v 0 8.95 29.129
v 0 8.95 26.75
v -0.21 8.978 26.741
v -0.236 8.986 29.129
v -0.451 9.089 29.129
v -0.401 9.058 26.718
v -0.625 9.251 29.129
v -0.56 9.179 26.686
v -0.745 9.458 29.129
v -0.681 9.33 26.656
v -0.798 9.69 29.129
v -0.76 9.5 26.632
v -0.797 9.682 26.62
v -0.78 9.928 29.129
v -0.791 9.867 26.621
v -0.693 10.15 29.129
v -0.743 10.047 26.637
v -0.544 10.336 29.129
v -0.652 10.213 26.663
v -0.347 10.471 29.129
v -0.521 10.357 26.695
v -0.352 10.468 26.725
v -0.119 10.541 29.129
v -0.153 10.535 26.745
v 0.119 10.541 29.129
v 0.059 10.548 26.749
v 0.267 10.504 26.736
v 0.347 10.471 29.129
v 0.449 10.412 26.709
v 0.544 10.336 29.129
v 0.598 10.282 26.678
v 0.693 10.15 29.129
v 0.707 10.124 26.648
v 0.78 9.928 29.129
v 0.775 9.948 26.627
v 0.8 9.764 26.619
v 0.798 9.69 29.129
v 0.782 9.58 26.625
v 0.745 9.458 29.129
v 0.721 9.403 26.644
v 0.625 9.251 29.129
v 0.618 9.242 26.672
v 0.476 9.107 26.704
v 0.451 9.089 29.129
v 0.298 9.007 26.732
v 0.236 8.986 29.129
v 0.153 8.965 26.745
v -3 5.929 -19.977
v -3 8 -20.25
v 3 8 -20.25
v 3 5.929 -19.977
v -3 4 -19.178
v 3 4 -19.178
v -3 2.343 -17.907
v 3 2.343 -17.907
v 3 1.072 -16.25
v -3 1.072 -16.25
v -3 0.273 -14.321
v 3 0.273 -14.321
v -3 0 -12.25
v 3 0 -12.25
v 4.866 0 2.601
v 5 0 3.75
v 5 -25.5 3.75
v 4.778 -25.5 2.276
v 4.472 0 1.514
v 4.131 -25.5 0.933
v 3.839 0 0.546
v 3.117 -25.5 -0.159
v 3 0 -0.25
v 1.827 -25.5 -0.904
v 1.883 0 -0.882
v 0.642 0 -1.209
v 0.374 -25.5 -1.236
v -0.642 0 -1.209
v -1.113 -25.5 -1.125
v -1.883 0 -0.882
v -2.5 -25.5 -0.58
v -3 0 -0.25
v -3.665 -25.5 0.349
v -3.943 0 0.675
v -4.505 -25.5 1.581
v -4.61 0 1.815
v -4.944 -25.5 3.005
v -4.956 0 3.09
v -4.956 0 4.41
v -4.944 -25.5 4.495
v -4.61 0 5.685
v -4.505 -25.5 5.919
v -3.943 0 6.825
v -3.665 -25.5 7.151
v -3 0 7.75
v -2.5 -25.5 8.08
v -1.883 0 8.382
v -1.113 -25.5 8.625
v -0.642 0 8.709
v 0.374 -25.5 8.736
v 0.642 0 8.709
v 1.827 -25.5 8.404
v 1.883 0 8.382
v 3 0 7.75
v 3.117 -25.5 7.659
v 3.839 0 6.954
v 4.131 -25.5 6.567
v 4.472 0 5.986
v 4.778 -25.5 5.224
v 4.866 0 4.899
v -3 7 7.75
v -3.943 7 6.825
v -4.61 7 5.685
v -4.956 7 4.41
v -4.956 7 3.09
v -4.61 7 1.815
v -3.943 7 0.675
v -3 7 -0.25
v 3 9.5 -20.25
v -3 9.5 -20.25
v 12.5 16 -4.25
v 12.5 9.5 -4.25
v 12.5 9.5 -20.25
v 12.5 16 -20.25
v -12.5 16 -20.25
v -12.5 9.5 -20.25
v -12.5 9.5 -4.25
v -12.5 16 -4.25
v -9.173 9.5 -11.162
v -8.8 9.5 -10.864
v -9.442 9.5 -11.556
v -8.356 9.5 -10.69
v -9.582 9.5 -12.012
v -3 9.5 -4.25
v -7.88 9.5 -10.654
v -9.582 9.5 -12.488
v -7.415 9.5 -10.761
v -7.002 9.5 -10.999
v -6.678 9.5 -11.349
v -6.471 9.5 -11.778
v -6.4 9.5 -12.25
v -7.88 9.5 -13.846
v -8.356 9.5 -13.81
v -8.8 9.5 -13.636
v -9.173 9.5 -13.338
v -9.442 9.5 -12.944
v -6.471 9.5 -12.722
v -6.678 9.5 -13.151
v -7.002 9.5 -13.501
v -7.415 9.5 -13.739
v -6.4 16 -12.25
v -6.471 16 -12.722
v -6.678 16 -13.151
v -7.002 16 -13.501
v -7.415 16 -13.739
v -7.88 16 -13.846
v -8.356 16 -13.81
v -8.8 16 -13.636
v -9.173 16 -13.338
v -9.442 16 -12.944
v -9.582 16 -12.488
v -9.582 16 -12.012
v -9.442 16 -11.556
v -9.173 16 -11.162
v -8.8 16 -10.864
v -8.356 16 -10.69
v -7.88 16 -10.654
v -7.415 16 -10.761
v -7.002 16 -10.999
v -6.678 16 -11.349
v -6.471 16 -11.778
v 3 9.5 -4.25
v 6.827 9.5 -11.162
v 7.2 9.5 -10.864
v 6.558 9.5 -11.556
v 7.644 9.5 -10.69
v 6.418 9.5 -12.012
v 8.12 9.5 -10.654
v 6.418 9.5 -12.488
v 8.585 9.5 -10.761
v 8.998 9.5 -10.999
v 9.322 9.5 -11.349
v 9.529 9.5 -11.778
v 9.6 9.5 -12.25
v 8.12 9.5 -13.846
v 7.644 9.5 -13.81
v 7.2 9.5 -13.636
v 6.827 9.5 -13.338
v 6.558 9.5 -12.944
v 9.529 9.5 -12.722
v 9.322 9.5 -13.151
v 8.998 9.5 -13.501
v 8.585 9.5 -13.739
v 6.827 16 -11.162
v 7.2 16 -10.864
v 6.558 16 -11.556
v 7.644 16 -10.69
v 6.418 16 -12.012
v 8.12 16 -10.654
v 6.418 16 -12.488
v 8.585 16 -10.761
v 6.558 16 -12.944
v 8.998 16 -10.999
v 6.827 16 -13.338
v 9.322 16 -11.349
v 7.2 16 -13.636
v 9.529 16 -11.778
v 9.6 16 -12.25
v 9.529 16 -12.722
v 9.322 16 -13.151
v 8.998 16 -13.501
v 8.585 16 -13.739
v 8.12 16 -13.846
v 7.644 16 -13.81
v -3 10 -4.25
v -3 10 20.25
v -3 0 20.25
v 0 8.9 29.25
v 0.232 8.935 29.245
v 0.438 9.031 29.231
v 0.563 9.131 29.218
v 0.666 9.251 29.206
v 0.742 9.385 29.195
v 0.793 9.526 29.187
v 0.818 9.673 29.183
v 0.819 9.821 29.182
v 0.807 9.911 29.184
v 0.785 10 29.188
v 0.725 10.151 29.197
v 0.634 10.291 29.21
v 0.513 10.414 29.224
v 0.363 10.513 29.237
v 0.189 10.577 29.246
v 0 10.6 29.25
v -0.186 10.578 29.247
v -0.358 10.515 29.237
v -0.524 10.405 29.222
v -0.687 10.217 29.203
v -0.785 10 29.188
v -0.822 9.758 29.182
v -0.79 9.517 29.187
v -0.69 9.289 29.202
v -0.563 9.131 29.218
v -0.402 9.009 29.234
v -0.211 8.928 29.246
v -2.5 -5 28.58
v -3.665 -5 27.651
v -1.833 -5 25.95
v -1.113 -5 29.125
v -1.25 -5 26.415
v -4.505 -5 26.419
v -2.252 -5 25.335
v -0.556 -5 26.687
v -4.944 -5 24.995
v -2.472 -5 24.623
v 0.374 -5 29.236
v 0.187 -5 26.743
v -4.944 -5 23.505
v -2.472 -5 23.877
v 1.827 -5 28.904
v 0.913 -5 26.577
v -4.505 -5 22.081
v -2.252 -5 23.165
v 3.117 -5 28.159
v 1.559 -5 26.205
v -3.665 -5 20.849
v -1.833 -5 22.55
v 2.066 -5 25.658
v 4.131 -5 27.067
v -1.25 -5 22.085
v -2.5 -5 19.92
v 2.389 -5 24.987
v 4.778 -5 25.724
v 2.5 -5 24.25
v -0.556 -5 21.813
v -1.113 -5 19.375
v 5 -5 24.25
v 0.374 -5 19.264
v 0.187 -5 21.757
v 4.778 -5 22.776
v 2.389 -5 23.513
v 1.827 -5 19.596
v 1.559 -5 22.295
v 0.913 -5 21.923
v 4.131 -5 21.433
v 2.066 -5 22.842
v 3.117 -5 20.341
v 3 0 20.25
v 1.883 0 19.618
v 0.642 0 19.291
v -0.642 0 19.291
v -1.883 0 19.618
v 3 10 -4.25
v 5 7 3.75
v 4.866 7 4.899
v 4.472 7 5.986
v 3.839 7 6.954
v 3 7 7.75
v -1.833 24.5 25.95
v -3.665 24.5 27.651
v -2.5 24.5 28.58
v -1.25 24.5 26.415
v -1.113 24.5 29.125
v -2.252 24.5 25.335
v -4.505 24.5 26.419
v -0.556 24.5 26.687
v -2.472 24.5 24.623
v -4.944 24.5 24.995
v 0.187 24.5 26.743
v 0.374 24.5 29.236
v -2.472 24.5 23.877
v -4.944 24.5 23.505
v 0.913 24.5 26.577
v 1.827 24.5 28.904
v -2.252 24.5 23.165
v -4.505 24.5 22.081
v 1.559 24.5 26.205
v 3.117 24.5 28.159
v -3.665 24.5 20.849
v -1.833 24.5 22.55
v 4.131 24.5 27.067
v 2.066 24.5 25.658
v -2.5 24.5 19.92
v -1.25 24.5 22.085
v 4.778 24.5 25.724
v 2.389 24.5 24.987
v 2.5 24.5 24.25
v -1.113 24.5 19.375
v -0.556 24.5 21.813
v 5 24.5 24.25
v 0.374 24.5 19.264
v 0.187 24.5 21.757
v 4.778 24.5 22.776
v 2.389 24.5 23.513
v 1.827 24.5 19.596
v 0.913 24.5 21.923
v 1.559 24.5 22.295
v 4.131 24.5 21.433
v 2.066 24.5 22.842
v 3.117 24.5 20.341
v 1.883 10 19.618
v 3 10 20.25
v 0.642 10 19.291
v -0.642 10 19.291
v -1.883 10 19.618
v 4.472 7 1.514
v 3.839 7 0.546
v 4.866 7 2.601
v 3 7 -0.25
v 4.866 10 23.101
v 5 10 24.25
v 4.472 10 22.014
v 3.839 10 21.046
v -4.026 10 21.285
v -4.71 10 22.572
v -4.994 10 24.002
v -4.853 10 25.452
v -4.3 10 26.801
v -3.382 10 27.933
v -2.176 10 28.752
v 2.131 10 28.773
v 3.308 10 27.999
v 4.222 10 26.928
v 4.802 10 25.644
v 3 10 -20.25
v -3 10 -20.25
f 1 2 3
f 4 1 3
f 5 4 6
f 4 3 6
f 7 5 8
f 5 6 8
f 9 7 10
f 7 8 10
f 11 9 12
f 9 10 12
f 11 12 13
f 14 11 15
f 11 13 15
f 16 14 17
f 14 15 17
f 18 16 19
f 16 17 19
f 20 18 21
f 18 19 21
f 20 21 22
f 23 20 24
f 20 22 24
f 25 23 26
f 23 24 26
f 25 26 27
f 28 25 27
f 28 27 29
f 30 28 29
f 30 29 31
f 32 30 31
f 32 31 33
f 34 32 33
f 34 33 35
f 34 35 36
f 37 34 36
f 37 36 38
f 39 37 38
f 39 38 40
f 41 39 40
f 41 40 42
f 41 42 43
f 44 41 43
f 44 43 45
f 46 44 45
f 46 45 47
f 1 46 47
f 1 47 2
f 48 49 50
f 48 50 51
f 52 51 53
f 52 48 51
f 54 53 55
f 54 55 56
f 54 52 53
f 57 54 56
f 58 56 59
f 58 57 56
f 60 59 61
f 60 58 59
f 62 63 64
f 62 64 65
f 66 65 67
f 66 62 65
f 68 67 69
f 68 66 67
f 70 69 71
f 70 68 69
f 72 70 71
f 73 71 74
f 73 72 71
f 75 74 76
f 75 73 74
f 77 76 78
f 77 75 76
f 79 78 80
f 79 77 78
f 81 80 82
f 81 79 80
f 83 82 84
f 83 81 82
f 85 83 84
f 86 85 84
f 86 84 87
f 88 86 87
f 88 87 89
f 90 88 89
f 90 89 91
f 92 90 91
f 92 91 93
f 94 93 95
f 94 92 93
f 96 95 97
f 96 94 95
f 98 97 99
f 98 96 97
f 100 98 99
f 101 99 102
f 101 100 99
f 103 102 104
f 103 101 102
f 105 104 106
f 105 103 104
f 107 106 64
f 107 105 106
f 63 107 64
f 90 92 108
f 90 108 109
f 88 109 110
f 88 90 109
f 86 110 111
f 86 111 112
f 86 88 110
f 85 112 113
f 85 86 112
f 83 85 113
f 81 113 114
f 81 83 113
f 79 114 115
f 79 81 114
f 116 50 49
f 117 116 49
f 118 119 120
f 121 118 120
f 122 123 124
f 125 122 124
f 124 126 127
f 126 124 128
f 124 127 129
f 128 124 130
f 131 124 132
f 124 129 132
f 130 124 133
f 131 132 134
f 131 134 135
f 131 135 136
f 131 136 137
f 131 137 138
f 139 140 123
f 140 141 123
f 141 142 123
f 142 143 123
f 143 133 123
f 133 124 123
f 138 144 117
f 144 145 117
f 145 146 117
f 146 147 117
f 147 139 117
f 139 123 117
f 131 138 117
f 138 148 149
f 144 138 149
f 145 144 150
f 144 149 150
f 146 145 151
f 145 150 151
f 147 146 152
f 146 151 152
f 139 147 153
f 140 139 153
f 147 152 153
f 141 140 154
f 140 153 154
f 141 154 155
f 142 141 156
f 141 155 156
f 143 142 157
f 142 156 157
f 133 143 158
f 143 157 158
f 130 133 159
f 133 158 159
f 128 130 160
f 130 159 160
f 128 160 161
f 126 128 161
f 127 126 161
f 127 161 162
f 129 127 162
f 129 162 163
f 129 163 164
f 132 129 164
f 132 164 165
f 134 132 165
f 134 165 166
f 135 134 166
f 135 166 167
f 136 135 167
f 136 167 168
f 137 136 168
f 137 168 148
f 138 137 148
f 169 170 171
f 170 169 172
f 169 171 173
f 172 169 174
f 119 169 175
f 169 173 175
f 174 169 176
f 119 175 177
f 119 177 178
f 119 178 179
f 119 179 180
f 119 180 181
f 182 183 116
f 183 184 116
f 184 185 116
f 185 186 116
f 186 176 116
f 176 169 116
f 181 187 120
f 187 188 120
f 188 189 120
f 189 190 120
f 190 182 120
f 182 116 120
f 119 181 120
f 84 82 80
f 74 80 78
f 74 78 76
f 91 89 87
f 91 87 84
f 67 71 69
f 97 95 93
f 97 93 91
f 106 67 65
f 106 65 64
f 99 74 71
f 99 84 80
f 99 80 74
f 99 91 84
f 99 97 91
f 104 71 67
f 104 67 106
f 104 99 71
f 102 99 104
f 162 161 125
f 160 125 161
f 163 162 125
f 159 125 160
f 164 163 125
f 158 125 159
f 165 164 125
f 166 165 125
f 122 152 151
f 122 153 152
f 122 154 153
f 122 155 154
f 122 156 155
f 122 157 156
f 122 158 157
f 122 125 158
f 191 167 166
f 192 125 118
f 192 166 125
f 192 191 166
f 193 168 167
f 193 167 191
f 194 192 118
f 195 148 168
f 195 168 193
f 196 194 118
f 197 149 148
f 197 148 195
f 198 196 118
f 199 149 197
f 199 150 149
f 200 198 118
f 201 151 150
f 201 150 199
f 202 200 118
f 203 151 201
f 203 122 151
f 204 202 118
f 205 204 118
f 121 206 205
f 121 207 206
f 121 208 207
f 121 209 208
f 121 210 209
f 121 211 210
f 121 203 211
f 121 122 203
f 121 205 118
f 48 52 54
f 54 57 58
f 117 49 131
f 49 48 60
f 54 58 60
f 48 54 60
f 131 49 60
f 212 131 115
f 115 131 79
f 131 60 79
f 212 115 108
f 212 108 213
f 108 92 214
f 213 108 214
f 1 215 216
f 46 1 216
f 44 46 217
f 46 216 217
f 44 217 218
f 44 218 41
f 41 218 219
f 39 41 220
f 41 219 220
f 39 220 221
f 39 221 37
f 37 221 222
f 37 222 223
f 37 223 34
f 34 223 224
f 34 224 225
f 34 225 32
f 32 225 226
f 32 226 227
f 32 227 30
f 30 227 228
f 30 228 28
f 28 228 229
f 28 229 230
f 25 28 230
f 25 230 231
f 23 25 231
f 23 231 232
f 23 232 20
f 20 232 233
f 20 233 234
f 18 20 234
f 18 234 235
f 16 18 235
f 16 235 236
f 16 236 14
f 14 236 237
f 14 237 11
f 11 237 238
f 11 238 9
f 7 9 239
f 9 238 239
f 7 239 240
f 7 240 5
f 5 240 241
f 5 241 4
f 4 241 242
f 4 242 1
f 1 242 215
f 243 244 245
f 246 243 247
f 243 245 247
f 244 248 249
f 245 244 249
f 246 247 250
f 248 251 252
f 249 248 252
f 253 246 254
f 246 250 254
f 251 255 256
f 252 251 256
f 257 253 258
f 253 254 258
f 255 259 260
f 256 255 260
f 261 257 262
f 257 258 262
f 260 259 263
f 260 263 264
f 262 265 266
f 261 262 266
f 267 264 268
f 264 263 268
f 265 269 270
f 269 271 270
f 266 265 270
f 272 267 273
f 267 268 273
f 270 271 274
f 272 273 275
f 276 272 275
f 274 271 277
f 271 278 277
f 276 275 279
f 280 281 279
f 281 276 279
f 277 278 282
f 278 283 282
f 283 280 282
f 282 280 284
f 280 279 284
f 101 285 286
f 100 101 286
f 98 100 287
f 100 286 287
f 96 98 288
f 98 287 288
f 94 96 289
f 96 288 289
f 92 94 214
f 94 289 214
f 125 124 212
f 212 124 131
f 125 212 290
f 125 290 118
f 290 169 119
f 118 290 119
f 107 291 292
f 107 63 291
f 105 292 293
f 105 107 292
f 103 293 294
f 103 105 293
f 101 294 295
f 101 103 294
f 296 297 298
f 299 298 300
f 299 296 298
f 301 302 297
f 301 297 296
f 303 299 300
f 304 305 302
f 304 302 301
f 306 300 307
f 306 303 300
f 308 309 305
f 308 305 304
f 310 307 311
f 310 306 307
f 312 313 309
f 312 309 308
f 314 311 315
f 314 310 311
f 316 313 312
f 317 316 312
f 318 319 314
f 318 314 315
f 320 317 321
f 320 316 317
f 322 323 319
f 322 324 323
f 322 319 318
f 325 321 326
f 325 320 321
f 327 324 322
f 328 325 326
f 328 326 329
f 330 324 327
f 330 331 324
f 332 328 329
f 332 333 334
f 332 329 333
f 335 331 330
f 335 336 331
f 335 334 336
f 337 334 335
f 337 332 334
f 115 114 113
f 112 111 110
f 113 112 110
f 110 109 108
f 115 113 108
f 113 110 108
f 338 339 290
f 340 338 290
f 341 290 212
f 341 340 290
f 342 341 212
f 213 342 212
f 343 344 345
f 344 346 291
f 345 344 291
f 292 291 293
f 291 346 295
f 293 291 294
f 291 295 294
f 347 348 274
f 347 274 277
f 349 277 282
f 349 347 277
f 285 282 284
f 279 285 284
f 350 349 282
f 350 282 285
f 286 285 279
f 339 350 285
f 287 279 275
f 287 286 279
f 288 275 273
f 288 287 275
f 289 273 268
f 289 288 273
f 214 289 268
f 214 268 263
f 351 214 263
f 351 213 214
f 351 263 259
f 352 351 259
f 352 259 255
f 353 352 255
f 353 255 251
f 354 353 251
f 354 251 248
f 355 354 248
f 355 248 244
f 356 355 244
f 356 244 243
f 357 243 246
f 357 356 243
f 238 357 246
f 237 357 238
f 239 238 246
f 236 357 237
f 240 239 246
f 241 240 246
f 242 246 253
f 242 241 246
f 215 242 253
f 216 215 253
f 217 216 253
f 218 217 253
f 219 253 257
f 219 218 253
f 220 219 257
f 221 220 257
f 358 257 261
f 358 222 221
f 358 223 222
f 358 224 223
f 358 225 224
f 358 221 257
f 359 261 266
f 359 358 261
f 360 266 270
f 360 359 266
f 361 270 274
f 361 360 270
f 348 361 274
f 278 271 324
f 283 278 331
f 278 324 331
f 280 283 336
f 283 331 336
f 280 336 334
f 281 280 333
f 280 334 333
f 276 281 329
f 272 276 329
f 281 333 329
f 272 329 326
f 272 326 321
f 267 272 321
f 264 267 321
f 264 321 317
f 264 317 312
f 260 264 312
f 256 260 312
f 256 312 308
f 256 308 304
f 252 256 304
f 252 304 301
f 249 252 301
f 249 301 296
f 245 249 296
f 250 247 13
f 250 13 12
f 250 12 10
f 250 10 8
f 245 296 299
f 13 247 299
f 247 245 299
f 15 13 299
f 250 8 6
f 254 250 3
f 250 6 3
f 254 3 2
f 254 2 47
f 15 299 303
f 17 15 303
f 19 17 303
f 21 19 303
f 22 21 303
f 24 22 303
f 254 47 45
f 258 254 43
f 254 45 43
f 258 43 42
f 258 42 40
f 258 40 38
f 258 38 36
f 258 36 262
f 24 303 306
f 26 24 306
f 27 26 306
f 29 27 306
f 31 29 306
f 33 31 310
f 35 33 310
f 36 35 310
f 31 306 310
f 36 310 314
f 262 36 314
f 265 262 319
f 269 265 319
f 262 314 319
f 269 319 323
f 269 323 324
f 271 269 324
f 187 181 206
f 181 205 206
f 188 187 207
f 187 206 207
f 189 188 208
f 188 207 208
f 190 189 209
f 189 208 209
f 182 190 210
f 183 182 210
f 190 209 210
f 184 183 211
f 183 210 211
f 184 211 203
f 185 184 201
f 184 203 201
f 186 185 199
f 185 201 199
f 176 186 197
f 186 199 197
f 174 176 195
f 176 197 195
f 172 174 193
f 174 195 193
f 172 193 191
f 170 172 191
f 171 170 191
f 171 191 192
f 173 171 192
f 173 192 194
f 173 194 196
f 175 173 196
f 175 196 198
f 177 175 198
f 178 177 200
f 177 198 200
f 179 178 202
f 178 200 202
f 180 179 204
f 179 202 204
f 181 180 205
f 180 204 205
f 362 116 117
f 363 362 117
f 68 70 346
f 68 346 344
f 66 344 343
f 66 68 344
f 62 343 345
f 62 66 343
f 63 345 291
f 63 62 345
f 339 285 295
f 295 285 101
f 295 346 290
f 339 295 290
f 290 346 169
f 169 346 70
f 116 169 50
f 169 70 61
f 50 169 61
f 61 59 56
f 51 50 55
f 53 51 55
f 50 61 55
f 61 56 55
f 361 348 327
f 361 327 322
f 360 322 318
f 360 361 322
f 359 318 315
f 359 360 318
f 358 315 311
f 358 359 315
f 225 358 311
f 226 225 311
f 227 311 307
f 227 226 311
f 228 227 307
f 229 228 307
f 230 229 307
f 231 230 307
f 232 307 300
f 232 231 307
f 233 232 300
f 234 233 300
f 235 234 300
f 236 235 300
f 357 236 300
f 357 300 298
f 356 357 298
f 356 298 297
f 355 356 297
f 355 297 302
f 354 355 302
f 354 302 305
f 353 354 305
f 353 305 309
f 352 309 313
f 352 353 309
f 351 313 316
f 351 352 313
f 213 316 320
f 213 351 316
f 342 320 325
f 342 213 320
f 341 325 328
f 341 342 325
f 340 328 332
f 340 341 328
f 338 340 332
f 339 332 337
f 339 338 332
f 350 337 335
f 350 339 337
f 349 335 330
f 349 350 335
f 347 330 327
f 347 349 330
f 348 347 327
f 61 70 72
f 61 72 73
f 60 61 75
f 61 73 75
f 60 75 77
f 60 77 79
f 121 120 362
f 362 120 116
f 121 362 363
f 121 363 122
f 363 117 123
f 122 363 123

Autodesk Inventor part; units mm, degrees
ref_plane "YZ Plane" through (0, 0, 0) normal (1, 0, 0) x (0, 1, 0)
ref_plane "XZ Plane" through (0, 0, 0) normal (0, 1, 0) x (-1, 0, 0)
sketch "Sketch1" plane through (0, 0, 0) normal (0, 1, 0) x (-1, 0, 0)
  line L0 (3, 20.25) -> (-3, 20.25)
  line L1 (-3, 20.25) -> (-3, -20.25)
  line L2 (-3, -20.25) -> (3, -20.25)
  line L3 (3, -20.25) -> (3, 20.25)
  line L4 (3, 20.25) -> (-3, -20.25) construction
  line L5 (-3, 20.25) -> (3, -20.25) construction
  point P0 (0, 0)
  dimension "d0" = 6
  dimension "d1" = 40.5
extrude "Extrusion1" add sketch "Sketch1" along normal blind 10
fillet "Fillet1" radius 8 1 edges at (0, 0, -20.25)
sketch "Sketch2" plane through (0, 10, 0) normal (0, 1, 0) x (1, 0, 0)
  line L0 (3, 20.25) -> (-3, 20.25) construction
  line L1 (0, 20.25) -> (0, -24.25) construction
  circle A0 centre (0, -24.25) radius 5
  point P0 (0, 0)
  dimension "d5" = 44.5
  dimension "d6" = 10
extrude "Extrusion2" add sketch "Sketch2" along normal blind 14.5 and the other way blind 15
sketch "Sketch3" plane through (0, 0, 0) normal (0, -1, 0) x (1, 0, 0)
  line L0 (3, -20.25) -> (-3, -20.25) construction
  line L1 (0, -20.25) -> (0, 3.75) construction
  circle A0 centre (0, 3.75) radius 5
  point P0 (0, 0)
  dimension "d11" = 24
  dimension "d12" = 10
extrude "Extrusion3" add sketch "Sketch3" along normal blind 25.5 and the other way blind 7
sketch "Sketch4" plane through (0, 10, 0) normal (0, 1, 0) x (1, 0, 0)
  line L0 (-3, 20.25) -> (3, 20.25) construction
  line L1 (0, 20.25) -> (0, 12.25) construction
  line L2 (-12.5, 4.25) -> (12.5, 4.25)
  line L3 (12.5, 4.25) -> (12.5, 20.25)
  line L4 (12.5, 20.25) -> (-12.5, 20.25)
  line L5 (-12.5, 20.25) -> (-12.5, 4.25)
  line L6 (-12.5, 4.25) -> (12.5, 20.25) construction
  line L7 (12.5, 4.25) -> (-12.5, 20.25) construction
  point P0 (0, 0)
  dimension "d17" = 8
  dimension "d18" = 25
extrude "Extrusion4" add sketch "Sketch4" along normal blind 6 and the other way blind 0.5
sketch "Sketch5" plane through (0, 16, 0) normal (0, 1, 0) x (1, 0, 0)
  line L0 (-3, 20.25) -> (3, 20.25) construction
  line L1 (0, 20.25) -> (0, 12.25) construction
  line L2 (0, 12.25) -> (-8, 12.25) construction
  circle A0 centre (-8, 12.25) radius 1.6
  circle A1 centre (8, 12.25) radius 1.6
  point P0 (0, 0)
  dimension "d23" = 8
  dimension "d24" = 8
  dimension "d25" = 3.2
extrude "Extrusion5" cut sketch "Sketch5" against normal through all
sketch "Sketch6" plane through (0, 24.5, 24.25) normal (0, 1, 0) x (1, 0, 0)
  circle A0 centre (0, 0) radius 2.5
  point P0 (0, 24.25)
  dimension "d28" = 5
extrude "Extrusion6" cut sketch "Sketch6" against normal through all
ref_plane "Work Plane1" through (0, 0, 29.25) normal (0, 0, 1) x (1, 0, 0)
sketch "Sketch8" plane through (0, 0, 29.25) normal (0, 0, 1) x (1, 0, 0)
  line L0 (5, 24.5) -> (-5, 24.5) projected
  line L1 (0, 24.5) -> (0, 9.75)
  circle A0 centre (0, 9.75) radius 0.8
  point P0 (0, 0)
  dimension "d39" = 14.75
  dimension "d40" = 1.6
hole "Hole2" at (0, 9.75, 29.25) direction (0, 0, -1) diameter 1.6 end up to surface countersink diameter 1.7 countersink angle 45
properties part number "Supporto SX"
